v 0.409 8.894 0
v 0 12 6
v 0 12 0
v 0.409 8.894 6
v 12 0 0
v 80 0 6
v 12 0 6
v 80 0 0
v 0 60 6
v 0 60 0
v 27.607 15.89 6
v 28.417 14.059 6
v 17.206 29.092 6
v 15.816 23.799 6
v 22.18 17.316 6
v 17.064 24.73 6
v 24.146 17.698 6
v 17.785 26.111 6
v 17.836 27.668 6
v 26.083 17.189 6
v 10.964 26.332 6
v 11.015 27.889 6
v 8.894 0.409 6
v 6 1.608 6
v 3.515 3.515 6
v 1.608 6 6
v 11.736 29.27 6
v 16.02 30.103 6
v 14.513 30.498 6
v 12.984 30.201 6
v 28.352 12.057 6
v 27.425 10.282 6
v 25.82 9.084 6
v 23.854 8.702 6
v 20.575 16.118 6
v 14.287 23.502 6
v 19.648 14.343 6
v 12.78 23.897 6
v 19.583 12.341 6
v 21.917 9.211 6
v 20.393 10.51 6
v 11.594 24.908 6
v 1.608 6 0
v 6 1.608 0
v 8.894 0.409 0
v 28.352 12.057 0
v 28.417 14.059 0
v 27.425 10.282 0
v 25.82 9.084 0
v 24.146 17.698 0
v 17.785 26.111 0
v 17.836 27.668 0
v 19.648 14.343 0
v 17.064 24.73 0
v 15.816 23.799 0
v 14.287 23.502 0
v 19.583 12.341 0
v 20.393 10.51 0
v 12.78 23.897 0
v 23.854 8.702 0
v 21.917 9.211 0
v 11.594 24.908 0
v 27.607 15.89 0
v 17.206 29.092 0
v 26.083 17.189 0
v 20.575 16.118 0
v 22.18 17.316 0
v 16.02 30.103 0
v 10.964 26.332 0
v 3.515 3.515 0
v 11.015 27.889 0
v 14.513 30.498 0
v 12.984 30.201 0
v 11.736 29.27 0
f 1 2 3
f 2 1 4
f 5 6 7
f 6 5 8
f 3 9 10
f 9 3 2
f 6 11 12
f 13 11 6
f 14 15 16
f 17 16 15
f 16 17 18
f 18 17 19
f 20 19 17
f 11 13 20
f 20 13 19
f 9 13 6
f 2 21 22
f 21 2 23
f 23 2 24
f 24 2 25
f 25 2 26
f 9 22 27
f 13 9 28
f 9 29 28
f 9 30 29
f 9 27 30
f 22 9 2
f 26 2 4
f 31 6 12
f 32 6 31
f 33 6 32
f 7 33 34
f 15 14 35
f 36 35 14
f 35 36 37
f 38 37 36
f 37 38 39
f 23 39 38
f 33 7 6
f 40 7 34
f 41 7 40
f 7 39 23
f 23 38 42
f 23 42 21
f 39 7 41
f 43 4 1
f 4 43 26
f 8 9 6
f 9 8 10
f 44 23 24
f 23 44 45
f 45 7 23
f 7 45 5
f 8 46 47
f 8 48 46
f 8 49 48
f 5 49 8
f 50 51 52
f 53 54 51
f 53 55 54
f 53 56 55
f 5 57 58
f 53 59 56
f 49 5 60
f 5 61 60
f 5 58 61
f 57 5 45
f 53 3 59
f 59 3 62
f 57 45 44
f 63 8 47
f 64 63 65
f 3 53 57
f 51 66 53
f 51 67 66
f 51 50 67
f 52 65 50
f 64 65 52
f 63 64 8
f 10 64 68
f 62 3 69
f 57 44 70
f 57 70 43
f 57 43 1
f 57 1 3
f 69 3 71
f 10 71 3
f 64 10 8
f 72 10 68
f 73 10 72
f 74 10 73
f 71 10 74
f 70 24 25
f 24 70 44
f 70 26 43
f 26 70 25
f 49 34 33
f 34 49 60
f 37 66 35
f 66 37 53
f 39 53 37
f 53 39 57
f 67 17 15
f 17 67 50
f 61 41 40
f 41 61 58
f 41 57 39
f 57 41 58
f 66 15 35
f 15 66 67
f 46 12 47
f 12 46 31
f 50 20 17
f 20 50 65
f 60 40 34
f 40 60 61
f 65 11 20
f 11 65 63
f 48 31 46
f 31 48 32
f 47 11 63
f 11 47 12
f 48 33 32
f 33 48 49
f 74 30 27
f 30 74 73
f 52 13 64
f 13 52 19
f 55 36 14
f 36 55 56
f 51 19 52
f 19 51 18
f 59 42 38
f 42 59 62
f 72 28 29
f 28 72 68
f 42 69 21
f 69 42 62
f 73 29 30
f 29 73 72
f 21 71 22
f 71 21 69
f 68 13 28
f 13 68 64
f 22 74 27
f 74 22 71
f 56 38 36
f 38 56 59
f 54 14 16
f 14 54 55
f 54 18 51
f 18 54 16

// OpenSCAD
$fn = 32;

// ----------------------------------------------------------------------
// Bracket plate: corner pad 80 x 60, fillet R12
// ----------------------------------------------------------------------

// --- parameters (mm) ---
hole_r = 3.5;             // bolt hole radius
plate_t = 6;              // plate thickness, Z (extrusion height)
leg_a = 80;               // base leg
leg_b = 60;               // height leg
fillet_r = 12;            // right-angle fillet radius

hole_d1 = 2 * hole_r + 2;
hole_d2 = 2 * hole_r;

profile = [[12, 0], [80, 0], [0, 60], [0, 12], [0.409, 8.894], [1.608, 6], [3.515, 3.515], [6, 1.608], [8.894, 0.409]];  // primary outline, 9 points, counter clockwise
void_1 = [[28.417, 14.059], [27.607, 15.89], [26.083, 17.189], [24.146, 17.698], [22.18, 17.316], [20.575, 16.118], [19.648, 14.343], [19.583, 12.341], [20.393, 10.51], [21.917, 9.211], [23.854, 8.702], [25.82, 9.084], [27.425, 10.282], [28.352, 12.057]];  // mount hole 1, 14 points
void_2 = [[17.836, 27.668], [17.206, 29.092], [16.02, 30.103], [14.513, 30.498], [12.984, 30.201], [11.736, 29.27], [11.015, 27.889], [10.964, 26.332], [11.594, 24.908], [12.78, 23.897], [14.287, 23.502], [15.816, 23.799], [17.064, 24.73], [17.785, 26.111]];  // mount hole 2, 14 points

// --- the one profile operation ---
difference() {
  linear_extrude(height = plate_t) polygon(points = profile);
  translate([0, 0, -1])
    linear_extrude(height = plate_t + 2) polygon(points = void_1);
  translate([0, 0, -1])
    linear_extrude(height = plate_t + 2) polygon(points = void_2);
}
